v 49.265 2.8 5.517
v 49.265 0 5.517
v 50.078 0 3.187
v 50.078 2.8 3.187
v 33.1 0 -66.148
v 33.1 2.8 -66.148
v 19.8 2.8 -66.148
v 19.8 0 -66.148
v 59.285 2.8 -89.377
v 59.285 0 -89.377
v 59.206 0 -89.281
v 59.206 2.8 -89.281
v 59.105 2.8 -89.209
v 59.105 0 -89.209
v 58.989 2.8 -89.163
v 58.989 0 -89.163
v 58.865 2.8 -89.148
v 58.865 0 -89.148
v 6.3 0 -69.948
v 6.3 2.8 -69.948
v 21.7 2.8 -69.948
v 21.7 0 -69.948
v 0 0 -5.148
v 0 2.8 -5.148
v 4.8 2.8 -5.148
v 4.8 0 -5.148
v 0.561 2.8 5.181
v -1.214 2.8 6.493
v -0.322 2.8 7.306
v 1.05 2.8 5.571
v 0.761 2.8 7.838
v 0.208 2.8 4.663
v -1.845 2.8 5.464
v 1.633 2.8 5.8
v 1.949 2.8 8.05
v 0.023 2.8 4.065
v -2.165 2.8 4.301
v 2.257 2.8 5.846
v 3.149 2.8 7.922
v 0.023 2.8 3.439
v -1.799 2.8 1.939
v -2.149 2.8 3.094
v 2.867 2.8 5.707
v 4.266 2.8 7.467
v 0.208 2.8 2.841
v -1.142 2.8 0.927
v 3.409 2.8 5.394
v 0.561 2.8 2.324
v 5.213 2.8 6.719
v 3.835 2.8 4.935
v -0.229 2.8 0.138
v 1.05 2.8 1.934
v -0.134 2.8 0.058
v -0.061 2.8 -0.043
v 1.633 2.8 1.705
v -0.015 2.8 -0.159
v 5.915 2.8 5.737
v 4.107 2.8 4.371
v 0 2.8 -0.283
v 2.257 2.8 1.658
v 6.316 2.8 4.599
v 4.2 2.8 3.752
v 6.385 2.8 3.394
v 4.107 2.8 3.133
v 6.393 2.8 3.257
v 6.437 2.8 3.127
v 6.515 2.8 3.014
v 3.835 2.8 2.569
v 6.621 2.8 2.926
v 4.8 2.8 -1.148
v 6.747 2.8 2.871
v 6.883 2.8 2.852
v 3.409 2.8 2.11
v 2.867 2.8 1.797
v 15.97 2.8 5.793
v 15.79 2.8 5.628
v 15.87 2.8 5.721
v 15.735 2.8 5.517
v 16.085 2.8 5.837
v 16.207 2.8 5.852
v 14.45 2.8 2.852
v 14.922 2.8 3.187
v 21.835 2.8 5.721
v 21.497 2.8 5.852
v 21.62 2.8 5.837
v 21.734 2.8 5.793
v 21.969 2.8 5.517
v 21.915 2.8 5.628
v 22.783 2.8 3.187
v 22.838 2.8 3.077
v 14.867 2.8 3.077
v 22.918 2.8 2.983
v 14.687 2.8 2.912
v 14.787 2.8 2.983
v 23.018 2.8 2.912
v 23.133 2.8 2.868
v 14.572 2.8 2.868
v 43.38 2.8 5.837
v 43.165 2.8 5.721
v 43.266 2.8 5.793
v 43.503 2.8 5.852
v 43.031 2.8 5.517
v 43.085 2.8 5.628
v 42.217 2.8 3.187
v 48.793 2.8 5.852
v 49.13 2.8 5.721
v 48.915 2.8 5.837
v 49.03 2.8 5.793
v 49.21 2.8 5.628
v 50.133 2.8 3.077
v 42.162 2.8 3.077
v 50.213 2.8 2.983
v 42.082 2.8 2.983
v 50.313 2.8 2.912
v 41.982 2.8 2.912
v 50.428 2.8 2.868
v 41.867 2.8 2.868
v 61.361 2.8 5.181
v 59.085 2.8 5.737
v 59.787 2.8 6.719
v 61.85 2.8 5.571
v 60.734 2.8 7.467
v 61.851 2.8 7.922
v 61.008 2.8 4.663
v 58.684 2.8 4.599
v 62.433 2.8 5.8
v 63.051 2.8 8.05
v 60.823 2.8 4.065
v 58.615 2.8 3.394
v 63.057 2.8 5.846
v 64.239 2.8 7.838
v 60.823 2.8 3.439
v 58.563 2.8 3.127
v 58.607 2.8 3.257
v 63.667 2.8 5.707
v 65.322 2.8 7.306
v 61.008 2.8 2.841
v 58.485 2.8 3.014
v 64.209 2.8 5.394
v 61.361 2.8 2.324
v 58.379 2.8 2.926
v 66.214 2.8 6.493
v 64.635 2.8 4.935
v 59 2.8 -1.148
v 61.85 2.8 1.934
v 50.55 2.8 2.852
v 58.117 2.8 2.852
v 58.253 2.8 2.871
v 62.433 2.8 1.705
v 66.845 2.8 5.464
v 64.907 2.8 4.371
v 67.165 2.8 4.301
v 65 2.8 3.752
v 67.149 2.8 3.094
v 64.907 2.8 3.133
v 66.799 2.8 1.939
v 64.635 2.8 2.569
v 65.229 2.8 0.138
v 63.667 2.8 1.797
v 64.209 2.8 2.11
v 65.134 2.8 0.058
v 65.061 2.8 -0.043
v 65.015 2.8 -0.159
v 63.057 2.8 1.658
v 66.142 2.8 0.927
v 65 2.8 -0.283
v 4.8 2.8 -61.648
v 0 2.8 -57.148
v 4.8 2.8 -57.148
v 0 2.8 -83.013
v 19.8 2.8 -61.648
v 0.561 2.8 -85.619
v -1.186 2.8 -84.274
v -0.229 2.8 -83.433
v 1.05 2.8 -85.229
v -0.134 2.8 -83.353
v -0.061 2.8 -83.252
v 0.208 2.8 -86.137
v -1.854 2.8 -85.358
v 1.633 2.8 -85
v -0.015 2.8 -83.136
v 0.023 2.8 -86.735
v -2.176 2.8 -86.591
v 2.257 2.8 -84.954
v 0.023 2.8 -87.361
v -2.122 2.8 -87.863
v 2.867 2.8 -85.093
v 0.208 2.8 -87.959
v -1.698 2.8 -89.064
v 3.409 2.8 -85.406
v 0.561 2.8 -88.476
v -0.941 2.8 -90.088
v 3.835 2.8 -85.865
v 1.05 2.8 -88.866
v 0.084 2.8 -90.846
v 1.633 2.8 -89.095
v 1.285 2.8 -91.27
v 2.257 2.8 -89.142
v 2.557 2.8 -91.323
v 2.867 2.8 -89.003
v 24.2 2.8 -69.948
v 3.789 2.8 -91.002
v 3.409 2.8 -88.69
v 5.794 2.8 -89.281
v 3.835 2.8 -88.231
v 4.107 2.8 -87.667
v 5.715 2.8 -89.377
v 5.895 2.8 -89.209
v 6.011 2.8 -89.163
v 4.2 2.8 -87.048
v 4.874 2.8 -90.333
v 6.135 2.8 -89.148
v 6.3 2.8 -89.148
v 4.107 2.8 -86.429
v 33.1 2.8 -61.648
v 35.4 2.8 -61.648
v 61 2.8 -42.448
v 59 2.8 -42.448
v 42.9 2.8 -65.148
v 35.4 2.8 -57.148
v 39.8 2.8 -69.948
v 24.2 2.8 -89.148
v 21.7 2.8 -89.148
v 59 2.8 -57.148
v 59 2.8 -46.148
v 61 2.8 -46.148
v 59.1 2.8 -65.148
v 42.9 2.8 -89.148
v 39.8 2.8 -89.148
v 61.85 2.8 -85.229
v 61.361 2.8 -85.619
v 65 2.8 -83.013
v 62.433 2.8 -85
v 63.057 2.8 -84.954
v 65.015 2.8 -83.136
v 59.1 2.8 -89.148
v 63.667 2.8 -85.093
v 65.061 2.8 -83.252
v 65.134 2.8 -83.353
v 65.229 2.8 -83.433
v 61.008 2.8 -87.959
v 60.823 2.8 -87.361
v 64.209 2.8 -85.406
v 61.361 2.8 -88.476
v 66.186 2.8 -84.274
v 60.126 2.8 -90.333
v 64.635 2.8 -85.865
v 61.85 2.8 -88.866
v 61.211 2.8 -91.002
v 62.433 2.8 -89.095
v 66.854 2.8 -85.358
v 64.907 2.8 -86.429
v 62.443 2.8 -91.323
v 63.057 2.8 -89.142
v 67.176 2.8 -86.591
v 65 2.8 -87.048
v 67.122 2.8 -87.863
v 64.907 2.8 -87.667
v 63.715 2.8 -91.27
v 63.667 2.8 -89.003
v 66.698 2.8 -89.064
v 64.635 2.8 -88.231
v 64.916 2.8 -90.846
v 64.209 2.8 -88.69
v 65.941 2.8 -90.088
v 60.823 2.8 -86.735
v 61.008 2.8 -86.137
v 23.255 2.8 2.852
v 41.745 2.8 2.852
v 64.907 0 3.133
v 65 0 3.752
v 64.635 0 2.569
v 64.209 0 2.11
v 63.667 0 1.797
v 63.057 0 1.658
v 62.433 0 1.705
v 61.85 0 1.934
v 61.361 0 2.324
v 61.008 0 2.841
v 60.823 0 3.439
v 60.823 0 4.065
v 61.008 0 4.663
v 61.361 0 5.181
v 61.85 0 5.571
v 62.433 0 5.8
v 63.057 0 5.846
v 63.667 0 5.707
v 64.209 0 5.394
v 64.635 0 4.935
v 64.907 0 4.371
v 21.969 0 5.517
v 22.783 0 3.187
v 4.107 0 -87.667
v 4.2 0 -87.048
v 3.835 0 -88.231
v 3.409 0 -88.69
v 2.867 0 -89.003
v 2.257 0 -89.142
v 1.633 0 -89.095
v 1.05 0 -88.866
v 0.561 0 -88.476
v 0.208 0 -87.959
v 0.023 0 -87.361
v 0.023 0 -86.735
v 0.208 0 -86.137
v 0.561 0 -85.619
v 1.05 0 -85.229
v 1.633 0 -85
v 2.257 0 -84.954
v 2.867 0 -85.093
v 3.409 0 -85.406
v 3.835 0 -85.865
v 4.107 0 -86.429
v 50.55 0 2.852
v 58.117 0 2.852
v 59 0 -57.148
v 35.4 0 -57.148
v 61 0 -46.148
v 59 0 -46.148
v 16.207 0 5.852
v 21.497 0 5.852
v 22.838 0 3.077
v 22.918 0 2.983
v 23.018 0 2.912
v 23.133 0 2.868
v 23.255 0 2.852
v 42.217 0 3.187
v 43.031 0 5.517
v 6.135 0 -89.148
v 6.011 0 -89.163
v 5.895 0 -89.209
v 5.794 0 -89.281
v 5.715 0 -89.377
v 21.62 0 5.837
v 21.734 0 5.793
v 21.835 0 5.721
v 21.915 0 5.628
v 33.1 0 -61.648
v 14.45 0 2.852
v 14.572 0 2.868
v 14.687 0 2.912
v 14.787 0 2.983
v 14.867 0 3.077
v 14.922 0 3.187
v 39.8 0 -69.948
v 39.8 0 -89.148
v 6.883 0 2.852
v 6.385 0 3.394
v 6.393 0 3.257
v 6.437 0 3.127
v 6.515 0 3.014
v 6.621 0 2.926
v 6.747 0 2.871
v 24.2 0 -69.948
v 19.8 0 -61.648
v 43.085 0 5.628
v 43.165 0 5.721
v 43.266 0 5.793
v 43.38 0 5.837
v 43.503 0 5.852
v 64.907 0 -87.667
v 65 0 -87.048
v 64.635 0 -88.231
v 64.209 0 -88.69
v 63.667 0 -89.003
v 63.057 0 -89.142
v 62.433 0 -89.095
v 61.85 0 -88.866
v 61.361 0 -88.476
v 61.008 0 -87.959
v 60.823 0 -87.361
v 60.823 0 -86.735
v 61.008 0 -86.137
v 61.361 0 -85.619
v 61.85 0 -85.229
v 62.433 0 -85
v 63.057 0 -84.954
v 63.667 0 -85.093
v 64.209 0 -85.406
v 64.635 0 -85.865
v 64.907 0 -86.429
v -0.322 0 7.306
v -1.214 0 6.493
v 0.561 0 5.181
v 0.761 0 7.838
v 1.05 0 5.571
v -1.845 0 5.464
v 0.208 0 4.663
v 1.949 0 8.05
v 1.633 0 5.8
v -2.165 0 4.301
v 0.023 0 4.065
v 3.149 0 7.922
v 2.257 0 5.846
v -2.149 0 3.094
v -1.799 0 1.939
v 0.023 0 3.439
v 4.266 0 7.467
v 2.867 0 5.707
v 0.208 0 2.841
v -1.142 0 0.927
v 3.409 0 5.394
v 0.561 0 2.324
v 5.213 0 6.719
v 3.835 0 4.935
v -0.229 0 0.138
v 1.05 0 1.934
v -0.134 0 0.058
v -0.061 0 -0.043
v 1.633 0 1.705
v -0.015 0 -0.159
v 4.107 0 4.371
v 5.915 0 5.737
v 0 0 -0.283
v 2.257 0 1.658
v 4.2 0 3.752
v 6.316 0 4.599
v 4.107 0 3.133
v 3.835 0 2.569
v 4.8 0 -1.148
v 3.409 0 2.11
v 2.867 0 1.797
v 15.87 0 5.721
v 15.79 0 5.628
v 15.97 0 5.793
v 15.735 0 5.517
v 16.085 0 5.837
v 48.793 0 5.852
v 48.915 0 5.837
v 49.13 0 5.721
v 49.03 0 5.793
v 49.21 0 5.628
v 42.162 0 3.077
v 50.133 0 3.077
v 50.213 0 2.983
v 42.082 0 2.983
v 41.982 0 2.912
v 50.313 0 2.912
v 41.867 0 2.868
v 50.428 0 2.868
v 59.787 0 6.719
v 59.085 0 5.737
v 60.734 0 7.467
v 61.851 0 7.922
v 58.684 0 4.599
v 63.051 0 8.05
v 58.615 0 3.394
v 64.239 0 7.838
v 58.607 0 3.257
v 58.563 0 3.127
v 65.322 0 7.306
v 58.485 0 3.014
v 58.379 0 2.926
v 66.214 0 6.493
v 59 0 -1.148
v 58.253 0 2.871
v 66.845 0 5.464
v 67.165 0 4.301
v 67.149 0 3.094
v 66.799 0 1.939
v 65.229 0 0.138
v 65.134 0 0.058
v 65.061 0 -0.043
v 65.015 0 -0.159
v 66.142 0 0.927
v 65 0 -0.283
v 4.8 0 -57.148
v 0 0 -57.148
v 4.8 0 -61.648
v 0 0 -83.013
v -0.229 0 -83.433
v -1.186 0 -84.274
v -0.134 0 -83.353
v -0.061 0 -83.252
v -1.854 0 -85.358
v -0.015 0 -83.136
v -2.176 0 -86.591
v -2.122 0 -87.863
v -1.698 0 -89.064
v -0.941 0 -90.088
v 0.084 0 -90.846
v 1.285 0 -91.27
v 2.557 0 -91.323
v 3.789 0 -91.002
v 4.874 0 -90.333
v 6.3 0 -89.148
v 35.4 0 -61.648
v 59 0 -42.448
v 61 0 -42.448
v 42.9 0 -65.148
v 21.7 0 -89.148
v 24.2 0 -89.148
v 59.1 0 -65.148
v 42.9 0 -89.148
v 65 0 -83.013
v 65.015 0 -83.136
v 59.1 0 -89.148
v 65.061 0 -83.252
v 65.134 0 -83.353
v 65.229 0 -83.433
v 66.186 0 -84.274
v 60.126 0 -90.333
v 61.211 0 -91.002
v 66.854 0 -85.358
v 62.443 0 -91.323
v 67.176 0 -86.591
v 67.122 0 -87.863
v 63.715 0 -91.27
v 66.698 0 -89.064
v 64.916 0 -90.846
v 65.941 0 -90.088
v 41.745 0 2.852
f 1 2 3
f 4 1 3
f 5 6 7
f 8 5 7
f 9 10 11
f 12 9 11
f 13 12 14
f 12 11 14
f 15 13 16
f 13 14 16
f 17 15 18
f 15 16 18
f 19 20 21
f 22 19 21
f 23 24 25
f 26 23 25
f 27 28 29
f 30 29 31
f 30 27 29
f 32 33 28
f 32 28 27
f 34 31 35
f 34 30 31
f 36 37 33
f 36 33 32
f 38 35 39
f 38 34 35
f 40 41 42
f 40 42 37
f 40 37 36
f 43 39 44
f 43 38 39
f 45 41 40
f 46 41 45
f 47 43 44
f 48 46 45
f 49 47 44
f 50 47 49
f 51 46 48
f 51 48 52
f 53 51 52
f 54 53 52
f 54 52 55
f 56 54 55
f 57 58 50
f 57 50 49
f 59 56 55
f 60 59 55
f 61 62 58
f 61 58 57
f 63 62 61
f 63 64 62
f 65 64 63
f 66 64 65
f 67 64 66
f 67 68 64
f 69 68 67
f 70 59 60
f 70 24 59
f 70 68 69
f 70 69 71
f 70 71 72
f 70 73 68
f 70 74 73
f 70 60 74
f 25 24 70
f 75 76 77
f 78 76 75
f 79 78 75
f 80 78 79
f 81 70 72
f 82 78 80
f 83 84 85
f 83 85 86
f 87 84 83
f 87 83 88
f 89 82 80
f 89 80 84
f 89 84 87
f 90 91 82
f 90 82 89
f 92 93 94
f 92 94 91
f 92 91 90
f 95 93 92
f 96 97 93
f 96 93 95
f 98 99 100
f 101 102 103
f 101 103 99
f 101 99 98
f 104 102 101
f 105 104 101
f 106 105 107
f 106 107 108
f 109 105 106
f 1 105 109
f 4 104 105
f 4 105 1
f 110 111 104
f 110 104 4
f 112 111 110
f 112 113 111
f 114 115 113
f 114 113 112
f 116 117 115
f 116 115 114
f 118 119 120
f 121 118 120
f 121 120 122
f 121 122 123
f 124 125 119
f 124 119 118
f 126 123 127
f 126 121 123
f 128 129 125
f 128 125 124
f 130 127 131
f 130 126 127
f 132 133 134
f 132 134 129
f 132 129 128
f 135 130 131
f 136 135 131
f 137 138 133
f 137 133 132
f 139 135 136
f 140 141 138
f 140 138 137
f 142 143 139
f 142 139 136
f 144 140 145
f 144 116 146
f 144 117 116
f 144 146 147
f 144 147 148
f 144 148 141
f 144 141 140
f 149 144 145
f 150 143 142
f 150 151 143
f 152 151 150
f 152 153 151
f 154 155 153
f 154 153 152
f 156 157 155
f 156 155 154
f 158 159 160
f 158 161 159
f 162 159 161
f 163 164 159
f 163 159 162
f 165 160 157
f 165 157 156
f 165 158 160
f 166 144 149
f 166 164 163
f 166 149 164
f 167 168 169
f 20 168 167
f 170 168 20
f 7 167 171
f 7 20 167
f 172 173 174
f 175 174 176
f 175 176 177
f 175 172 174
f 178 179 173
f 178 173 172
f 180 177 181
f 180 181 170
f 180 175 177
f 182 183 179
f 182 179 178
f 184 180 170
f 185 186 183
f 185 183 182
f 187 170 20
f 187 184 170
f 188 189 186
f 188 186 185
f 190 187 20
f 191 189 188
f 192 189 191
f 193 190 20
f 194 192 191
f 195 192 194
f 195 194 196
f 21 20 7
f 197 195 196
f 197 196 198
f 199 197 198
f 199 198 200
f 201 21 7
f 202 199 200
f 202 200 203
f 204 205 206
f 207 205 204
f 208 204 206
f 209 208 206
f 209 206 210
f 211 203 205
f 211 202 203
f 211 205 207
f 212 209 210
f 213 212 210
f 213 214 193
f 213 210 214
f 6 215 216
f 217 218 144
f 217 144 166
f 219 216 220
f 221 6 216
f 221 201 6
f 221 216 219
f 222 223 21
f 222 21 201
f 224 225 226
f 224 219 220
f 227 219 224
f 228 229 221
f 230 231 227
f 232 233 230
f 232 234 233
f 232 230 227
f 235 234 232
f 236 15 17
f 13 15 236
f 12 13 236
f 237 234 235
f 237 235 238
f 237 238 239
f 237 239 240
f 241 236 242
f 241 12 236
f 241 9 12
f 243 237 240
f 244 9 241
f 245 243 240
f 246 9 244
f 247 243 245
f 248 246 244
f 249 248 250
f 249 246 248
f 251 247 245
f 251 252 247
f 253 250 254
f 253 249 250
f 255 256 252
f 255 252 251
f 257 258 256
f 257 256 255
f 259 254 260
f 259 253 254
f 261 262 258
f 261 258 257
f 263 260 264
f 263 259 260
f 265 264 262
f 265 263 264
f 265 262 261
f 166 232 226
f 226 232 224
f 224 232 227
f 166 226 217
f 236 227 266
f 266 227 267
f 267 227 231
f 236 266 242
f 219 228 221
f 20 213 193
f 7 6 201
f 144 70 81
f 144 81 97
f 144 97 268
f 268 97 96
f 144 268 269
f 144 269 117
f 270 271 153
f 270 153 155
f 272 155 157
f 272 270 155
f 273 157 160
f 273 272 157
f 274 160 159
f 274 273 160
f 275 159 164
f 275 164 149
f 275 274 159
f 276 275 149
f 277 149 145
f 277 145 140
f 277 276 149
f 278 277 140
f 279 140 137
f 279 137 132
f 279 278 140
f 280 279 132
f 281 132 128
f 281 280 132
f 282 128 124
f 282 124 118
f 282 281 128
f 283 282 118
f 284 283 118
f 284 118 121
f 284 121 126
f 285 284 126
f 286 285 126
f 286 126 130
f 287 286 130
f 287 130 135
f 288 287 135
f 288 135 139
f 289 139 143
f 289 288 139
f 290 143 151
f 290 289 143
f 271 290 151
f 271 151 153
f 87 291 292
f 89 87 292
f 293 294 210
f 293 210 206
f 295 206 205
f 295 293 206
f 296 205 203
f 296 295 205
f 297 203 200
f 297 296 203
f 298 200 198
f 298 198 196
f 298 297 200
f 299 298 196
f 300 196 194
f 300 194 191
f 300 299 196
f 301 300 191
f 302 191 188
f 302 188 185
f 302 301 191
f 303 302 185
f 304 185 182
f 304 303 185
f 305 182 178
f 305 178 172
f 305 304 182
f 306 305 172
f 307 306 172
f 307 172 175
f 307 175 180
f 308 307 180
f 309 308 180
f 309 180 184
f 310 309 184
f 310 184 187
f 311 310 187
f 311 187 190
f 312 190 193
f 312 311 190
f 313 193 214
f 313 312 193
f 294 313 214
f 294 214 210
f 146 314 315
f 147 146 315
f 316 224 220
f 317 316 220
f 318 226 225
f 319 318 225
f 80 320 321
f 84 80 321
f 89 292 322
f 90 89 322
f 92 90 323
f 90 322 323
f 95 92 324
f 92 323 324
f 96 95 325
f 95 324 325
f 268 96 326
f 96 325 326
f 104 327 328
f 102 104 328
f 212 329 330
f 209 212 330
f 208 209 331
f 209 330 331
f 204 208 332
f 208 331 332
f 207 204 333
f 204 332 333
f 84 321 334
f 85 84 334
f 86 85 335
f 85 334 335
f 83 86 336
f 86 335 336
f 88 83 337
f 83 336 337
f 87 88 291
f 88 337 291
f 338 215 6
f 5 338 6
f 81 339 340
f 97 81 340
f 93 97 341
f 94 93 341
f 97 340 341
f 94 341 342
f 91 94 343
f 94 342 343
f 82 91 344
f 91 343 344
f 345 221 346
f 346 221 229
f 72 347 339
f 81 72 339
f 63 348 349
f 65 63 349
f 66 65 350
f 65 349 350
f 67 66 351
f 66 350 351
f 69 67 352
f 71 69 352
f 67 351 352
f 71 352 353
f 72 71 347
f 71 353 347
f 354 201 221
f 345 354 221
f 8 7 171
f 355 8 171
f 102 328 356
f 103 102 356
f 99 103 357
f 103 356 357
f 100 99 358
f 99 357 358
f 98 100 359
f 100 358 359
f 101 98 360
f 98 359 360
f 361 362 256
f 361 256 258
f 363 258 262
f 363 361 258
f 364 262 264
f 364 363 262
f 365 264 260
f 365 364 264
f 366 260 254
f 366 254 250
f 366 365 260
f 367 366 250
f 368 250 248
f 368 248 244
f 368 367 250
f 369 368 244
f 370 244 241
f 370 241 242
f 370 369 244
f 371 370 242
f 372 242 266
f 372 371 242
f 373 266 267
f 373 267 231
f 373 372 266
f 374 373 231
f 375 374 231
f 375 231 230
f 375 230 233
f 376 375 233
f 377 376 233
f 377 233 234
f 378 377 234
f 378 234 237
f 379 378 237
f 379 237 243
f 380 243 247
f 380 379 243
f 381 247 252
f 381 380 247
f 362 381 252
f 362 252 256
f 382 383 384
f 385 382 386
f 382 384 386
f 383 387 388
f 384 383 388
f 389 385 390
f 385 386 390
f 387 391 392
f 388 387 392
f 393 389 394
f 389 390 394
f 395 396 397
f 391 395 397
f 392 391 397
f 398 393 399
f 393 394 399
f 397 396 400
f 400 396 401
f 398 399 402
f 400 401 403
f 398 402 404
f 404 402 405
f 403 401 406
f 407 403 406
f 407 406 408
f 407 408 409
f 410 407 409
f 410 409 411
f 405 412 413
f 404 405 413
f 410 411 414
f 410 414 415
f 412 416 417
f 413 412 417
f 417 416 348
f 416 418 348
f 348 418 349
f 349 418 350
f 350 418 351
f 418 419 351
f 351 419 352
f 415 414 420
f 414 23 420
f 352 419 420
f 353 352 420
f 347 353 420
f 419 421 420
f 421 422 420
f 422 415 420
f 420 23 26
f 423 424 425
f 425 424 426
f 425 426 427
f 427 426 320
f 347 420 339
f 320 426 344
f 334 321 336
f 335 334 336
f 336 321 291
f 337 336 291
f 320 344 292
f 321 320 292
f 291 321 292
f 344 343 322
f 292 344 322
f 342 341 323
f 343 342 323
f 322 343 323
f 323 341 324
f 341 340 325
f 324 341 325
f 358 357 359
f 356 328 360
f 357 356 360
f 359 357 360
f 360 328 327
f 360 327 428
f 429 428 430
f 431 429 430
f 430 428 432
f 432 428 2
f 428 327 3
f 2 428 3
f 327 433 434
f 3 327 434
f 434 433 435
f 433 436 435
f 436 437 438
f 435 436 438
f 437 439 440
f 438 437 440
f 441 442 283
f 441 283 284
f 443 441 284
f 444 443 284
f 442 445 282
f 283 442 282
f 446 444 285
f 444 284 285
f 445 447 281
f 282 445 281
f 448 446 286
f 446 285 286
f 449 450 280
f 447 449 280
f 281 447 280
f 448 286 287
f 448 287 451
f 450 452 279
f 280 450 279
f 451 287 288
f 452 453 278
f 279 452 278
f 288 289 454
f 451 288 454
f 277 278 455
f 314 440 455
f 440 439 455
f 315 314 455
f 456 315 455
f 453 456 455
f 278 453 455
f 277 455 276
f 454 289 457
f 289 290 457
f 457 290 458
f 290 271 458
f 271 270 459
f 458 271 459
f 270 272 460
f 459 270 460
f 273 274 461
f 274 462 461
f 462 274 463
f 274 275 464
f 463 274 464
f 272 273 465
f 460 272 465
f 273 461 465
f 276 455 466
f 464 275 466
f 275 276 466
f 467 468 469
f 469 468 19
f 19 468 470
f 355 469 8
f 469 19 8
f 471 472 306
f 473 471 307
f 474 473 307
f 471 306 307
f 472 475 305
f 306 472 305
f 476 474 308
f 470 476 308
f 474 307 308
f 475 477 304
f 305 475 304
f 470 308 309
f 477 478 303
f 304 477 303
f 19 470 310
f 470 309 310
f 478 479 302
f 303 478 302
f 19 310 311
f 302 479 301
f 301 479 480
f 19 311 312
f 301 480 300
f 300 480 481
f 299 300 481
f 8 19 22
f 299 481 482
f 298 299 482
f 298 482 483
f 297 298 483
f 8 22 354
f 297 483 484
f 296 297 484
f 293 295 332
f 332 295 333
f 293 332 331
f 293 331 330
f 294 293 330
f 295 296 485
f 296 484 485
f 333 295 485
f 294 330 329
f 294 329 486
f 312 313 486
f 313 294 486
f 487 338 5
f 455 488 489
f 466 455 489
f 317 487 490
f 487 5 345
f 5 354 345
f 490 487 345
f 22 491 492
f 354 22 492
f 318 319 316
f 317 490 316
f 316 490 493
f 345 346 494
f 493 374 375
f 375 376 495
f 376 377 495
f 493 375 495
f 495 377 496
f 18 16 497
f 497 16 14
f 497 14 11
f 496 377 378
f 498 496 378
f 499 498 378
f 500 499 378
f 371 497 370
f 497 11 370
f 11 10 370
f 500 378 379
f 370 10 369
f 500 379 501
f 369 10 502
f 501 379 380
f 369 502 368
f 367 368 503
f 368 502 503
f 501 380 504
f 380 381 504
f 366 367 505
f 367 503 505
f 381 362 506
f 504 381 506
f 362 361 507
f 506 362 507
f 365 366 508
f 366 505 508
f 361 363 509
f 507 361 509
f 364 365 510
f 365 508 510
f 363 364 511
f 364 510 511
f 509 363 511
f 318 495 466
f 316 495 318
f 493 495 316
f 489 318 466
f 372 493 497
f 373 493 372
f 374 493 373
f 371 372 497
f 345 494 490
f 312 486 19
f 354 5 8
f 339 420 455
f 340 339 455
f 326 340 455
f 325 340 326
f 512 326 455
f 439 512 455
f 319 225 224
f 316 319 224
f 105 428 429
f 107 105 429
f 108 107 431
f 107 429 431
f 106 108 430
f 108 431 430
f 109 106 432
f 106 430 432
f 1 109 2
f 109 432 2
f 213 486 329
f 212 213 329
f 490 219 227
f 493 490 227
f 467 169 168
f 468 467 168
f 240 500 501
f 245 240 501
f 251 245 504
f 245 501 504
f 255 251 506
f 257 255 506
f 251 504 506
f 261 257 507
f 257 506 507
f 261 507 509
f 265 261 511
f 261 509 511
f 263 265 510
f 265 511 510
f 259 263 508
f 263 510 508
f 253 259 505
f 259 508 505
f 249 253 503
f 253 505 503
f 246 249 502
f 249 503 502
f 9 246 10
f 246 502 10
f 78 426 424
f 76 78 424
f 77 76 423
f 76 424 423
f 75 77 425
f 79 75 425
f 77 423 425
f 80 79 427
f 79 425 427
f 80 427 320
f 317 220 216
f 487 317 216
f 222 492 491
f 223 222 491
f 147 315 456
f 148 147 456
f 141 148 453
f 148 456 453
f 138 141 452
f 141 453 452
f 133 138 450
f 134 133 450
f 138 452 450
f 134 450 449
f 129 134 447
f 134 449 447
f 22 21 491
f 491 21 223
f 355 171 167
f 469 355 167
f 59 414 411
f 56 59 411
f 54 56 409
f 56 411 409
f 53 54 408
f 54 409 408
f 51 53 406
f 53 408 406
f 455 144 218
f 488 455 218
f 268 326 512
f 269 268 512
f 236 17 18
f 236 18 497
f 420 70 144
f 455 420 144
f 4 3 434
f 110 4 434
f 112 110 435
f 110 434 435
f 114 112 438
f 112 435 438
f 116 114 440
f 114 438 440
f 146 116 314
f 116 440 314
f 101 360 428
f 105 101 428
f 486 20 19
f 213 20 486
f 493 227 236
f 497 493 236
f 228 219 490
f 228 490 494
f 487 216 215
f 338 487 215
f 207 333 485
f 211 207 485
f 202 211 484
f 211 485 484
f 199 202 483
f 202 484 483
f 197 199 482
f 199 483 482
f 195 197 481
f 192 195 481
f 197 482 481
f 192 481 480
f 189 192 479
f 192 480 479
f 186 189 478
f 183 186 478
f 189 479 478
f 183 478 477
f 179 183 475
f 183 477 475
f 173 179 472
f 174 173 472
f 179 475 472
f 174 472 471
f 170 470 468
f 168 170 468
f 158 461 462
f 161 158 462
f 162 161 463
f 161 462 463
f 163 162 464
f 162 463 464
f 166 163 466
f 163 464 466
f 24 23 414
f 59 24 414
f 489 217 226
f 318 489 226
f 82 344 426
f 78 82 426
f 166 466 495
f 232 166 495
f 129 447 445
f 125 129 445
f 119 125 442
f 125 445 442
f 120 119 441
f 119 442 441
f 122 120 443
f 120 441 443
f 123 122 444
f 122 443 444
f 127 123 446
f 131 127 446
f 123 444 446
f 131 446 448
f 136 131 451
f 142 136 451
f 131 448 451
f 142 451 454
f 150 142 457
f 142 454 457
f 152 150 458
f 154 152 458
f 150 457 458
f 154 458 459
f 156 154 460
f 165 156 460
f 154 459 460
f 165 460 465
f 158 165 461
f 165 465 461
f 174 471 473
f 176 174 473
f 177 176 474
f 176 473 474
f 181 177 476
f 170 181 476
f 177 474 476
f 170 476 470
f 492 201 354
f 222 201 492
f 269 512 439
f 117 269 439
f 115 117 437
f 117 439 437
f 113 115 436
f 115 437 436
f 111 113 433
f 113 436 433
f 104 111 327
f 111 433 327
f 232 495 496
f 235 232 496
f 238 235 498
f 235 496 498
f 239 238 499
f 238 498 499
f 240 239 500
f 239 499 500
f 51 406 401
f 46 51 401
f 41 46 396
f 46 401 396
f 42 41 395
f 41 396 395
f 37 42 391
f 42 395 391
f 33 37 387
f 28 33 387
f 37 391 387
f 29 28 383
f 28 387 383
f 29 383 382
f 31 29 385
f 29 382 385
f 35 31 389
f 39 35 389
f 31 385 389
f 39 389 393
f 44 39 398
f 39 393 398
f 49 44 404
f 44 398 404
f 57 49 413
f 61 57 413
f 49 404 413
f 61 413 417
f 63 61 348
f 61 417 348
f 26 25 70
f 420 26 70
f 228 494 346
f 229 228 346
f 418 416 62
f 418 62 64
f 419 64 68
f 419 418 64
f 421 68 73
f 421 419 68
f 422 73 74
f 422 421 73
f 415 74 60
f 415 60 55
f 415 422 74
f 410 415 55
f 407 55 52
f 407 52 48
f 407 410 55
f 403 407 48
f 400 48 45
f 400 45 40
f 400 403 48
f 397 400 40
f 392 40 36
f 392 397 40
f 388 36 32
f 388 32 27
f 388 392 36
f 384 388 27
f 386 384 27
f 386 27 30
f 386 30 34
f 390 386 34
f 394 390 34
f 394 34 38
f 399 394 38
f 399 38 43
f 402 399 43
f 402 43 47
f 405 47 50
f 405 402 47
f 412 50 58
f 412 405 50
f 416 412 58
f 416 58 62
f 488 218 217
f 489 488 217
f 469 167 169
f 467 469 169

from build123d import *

# Parameters (mm, degrees)
BASEPLATE_OUTLINE_R = 2.1
BASEPLATE_DEPTH     = 2.8
CUT_EXTRUDE1_REACH  = 115.438
SKETCH3_W           = 15.4
SKETCH3_H           = 19.2
SKETCH3_W_2         = 15.6
SKETCH3_W_3         = 16.2
SKETCH3_H_2         = 24


# Read off the part's stored shape, not the designer's step: BasePlate
with BuildPart() as part:
    # BasePlate outline → BasePlate (new body)
    with BuildSketch(Plane(origin=(0, 0, 0), x_dir=(1, 0, 0), z_dir=(0, 1, 0))):
        with BuildLine():
            Line((43.502626614, -5.852332608), (48.792614178, -5.852332608))
            ThreePointArc((48.792614178, -5.852332608), (49.082078508, -5.760021707), (49.264659986, -5.517174213))
            Line((49.264659986, -5.517174213), (50.078201202, -3.187491002))
            ThreePointArc((50.078201202, -3.187491002), (50.26078268, -2.944643509), (50.55024701, -2.852332608))
            Line((50.55024701, -2.852332608), (58.116695703, -2.852332608))
            ThreePointArc((58.116695703, -2.852332608), (58.484685739, -3.013831008), (58.614956567, -3.393999275))
            ThreePointArc((58.614956567, -3.393999275), (64.799237397, -7.61016844), (65.229166667, -0.137781095))
            ThreePointArc((65.229166667, -0.137781095), (65.061014427, 0.043158816), (65, 0.282515593))
            Line((65, 0.282515593), (65, 83.012819192))
            ThreePointArc((65, 83.012819192), (65.061014427, 83.252175969), (65.229166667, 83.433115879))
            ThreePointArc((65.229166667, 83.433115879), (65.940559159, 90.088226551), (59.285448487, 89.376834059))
            ThreePointArc((59.285448487, 89.376834059), (59.104508577, 89.208681819), (58.8651518, 89.147667392))
            Line((58.8651518, 89.147667392), (6.1348482, 89.147667392))
            ThreePointArc((6.1348482, 89.147667392), (5.895491423, 89.208681819), (5.714551513, 89.376834059))
            ThreePointArc((5.714551513, 89.376834059), (-0.940559159, 90.088226551), (-0.229166667, 83.433115879))
            ThreePointArc((-0.229166667, 83.433115879), (-0.061014427, 83.252175969), (0, 83.012819192))
            Line((0, 83.012819192), (0, 0.282515593))
            ThreePointArc((0, 0.282515593), (-0.061014427, 0.043158816), (-0.229166667, -0.137781095))
            ThreePointArc((-0.229166667, -0.137781095), (0.200762603, -7.61016844), (6.385043433, -3.393999275))
            ThreePointArc((6.385043433, -3.393999275), (6.515314261, -3.013831008), (6.883304297, -2.852332608))
            Line((6.883304297, -2.852332608), (14.44975299, -2.852332608))
            ThreePointArc((14.44975299, -2.852332608), (14.73921732, -2.944643509), (14.921798798, -3.187491002))
            Line((14.921798798, -3.187491002), (15.735340014, -5.517174213))
            ThreePointArc((15.735340014, -5.517174213), (15.917921492, -5.760021707), (16.207385822, -5.852332608))
            Line((16.207385822, -5.852332608), (21.497373386, -5.852332608))
            ThreePointArc((21.497373386, -5.852332608), (21.786837716, -5.760021707), (21.969419194, -5.517174213))
            Line((21.969419194, -5.517174213), (22.78296041, -3.187491002))
            ThreePointArc((22.78296041, -3.187491002), (22.965541888, -2.944643509), (23.255006218, -2.852332608))
            Line((23.255006218, -2.852332608), (41.744993782, -2.852332608))
            ThreePointArc((41.744993782, -2.852332608), (42.034458112, -2.944643509), (42.21703959, -3.187491002))
            Line((42.21703959, -3.187491002), (43.030580806, -5.517174213))
            ThreePointArc((43.030580806, -5.517174213), (43.213162284, -5.760021707), (43.502626614, -5.852332608))
        make_face()
        with Locations((2.1, -3.752332608)):
            Circle(BASEPLATE_OUTLINE_R, mode=Mode.SUBTRACT)
        with Locations((62.9, -3.752332608)):
            Circle(BASEPLATE_OUTLINE_R, mode=Mode.SUBTRACT)
        with Locations((2.1, 87.047667392)):
            Circle(BASEPLATE_OUTLINE_R, mode=Mode.SUBTRACT)
        with Locations((62.9, 87.047667392)):
            Circle(BASEPLATE_OUTLINE_R, mode=Mode.SUBTRACT)
    extrude(amount=BASEPLATE_DEPTH)

    # Sketch3 → Cut-Extrude1 (cut, up to next)
    with BuildSketch(Plane(origin=(0, 2.8, 0), x_dir=(1, 0, 0), z_dir=(0, 1, 0)), mode=Mode.PRIVATE) as cut_extrude1_sk1:
        Polygon((4.8, 1.147667392), (59, 1.147667392), (59, 42.447667392), (61, 42.447667392), (61, 46.147667392), (59, 46.147667392), (59, 57.147667392), (35.4, 57.147667392), (35.4, 61.647667392), (33.1, 61.647667392), (33.1, 66.147667392), (19.8, 66.147667392), (19.8, 61.647667392), (4.8, 61.647667392), (4.8, 57.147667392), (0, 57.147667392), (0, 5.147667392), (4.8, 5.147667392), align=None)
    cut_extrude1_tool1 = extrude(cut_extrude1_sk1.sketch, amount=-CUT_EXTRUDE1_REACH, mode=Mode.PRIVATE) & part.part
    # Sketch3 → Cut-Extrude1 (cut, up to next)
    with BuildSketch(Plane(origin=(0, 2.8, 0), x_dir=(1, 0, 0), z_dir=(0, 1, 0)), mode=Mode.PRIVATE) as cut_extrude1_sk2:
        with Locations((14, 79.547667392)):
            Rectangle(SKETCH3_W, SKETCH3_H)
    cut_extrude1_tool2 = extrude(cut_extrude1_sk2.sketch, amount=-CUT_EXTRUDE1_REACH, mode=Mode.PRIVATE) & part.part
    # Sketch3 → Cut-Extrude1 (cut, up to next)
    with BuildSketch(Plane(origin=(0, 2.8, 0), x_dir=(1, 0, 0), z_dir=(0, 1, 0)), mode=Mode.PRIVATE) as cut_extrude1_sk3:
        with Locations((32, 79.547667392)):
            Rectangle(SKETCH3_W_2, SKETCH3_H)
    cut_extrude1_tool3 = extrude(cut_extrude1_sk3.sketch, amount=-CUT_EXTRUDE1_REACH, mode=Mode.PRIVATE) & part.part
    # Sketch3 → Cut-Extrude1 (cut, up to next)
    with BuildSketch(Plane(origin=(0, 2.8, 0), x_dir=(1, 0, 0), z_dir=(0, 1, 0)), mode=Mode.PRIVATE) as cut_extrude1_sk4:
        with Locations((51, 77.147667392)):
            Rectangle(SKETCH3_W_3, SKETCH3_H_2)
    cut_extrude1_tool4 = extrude(cut_extrude1_sk4.sketch, amount=-CUT_EXTRUDE1_REACH, mode=Mode.PRIVATE) & part.part
    add(cut_extrude1_tool1.solids().sort_by_distance((29.290557, 2.8, -31.112428))[0], mode=Mode.SUBTRACT)
    add(cut_extrude1_tool2.solids().sort_by_distance((14, 2.8, -79.547667))[0], mode=Mode.SUBTRACT)
    add(cut_extrude1_tool3.solids().sort_by_distance((32, 2.8, -79.547667))[0], mode=Mode.SUBTRACT)
    add(cut_extrude1_tool4.solids().sort_by_distance((51, 2.8, -77.147667))[0], mode=Mode.SUBTRACT)


solid = part.part
